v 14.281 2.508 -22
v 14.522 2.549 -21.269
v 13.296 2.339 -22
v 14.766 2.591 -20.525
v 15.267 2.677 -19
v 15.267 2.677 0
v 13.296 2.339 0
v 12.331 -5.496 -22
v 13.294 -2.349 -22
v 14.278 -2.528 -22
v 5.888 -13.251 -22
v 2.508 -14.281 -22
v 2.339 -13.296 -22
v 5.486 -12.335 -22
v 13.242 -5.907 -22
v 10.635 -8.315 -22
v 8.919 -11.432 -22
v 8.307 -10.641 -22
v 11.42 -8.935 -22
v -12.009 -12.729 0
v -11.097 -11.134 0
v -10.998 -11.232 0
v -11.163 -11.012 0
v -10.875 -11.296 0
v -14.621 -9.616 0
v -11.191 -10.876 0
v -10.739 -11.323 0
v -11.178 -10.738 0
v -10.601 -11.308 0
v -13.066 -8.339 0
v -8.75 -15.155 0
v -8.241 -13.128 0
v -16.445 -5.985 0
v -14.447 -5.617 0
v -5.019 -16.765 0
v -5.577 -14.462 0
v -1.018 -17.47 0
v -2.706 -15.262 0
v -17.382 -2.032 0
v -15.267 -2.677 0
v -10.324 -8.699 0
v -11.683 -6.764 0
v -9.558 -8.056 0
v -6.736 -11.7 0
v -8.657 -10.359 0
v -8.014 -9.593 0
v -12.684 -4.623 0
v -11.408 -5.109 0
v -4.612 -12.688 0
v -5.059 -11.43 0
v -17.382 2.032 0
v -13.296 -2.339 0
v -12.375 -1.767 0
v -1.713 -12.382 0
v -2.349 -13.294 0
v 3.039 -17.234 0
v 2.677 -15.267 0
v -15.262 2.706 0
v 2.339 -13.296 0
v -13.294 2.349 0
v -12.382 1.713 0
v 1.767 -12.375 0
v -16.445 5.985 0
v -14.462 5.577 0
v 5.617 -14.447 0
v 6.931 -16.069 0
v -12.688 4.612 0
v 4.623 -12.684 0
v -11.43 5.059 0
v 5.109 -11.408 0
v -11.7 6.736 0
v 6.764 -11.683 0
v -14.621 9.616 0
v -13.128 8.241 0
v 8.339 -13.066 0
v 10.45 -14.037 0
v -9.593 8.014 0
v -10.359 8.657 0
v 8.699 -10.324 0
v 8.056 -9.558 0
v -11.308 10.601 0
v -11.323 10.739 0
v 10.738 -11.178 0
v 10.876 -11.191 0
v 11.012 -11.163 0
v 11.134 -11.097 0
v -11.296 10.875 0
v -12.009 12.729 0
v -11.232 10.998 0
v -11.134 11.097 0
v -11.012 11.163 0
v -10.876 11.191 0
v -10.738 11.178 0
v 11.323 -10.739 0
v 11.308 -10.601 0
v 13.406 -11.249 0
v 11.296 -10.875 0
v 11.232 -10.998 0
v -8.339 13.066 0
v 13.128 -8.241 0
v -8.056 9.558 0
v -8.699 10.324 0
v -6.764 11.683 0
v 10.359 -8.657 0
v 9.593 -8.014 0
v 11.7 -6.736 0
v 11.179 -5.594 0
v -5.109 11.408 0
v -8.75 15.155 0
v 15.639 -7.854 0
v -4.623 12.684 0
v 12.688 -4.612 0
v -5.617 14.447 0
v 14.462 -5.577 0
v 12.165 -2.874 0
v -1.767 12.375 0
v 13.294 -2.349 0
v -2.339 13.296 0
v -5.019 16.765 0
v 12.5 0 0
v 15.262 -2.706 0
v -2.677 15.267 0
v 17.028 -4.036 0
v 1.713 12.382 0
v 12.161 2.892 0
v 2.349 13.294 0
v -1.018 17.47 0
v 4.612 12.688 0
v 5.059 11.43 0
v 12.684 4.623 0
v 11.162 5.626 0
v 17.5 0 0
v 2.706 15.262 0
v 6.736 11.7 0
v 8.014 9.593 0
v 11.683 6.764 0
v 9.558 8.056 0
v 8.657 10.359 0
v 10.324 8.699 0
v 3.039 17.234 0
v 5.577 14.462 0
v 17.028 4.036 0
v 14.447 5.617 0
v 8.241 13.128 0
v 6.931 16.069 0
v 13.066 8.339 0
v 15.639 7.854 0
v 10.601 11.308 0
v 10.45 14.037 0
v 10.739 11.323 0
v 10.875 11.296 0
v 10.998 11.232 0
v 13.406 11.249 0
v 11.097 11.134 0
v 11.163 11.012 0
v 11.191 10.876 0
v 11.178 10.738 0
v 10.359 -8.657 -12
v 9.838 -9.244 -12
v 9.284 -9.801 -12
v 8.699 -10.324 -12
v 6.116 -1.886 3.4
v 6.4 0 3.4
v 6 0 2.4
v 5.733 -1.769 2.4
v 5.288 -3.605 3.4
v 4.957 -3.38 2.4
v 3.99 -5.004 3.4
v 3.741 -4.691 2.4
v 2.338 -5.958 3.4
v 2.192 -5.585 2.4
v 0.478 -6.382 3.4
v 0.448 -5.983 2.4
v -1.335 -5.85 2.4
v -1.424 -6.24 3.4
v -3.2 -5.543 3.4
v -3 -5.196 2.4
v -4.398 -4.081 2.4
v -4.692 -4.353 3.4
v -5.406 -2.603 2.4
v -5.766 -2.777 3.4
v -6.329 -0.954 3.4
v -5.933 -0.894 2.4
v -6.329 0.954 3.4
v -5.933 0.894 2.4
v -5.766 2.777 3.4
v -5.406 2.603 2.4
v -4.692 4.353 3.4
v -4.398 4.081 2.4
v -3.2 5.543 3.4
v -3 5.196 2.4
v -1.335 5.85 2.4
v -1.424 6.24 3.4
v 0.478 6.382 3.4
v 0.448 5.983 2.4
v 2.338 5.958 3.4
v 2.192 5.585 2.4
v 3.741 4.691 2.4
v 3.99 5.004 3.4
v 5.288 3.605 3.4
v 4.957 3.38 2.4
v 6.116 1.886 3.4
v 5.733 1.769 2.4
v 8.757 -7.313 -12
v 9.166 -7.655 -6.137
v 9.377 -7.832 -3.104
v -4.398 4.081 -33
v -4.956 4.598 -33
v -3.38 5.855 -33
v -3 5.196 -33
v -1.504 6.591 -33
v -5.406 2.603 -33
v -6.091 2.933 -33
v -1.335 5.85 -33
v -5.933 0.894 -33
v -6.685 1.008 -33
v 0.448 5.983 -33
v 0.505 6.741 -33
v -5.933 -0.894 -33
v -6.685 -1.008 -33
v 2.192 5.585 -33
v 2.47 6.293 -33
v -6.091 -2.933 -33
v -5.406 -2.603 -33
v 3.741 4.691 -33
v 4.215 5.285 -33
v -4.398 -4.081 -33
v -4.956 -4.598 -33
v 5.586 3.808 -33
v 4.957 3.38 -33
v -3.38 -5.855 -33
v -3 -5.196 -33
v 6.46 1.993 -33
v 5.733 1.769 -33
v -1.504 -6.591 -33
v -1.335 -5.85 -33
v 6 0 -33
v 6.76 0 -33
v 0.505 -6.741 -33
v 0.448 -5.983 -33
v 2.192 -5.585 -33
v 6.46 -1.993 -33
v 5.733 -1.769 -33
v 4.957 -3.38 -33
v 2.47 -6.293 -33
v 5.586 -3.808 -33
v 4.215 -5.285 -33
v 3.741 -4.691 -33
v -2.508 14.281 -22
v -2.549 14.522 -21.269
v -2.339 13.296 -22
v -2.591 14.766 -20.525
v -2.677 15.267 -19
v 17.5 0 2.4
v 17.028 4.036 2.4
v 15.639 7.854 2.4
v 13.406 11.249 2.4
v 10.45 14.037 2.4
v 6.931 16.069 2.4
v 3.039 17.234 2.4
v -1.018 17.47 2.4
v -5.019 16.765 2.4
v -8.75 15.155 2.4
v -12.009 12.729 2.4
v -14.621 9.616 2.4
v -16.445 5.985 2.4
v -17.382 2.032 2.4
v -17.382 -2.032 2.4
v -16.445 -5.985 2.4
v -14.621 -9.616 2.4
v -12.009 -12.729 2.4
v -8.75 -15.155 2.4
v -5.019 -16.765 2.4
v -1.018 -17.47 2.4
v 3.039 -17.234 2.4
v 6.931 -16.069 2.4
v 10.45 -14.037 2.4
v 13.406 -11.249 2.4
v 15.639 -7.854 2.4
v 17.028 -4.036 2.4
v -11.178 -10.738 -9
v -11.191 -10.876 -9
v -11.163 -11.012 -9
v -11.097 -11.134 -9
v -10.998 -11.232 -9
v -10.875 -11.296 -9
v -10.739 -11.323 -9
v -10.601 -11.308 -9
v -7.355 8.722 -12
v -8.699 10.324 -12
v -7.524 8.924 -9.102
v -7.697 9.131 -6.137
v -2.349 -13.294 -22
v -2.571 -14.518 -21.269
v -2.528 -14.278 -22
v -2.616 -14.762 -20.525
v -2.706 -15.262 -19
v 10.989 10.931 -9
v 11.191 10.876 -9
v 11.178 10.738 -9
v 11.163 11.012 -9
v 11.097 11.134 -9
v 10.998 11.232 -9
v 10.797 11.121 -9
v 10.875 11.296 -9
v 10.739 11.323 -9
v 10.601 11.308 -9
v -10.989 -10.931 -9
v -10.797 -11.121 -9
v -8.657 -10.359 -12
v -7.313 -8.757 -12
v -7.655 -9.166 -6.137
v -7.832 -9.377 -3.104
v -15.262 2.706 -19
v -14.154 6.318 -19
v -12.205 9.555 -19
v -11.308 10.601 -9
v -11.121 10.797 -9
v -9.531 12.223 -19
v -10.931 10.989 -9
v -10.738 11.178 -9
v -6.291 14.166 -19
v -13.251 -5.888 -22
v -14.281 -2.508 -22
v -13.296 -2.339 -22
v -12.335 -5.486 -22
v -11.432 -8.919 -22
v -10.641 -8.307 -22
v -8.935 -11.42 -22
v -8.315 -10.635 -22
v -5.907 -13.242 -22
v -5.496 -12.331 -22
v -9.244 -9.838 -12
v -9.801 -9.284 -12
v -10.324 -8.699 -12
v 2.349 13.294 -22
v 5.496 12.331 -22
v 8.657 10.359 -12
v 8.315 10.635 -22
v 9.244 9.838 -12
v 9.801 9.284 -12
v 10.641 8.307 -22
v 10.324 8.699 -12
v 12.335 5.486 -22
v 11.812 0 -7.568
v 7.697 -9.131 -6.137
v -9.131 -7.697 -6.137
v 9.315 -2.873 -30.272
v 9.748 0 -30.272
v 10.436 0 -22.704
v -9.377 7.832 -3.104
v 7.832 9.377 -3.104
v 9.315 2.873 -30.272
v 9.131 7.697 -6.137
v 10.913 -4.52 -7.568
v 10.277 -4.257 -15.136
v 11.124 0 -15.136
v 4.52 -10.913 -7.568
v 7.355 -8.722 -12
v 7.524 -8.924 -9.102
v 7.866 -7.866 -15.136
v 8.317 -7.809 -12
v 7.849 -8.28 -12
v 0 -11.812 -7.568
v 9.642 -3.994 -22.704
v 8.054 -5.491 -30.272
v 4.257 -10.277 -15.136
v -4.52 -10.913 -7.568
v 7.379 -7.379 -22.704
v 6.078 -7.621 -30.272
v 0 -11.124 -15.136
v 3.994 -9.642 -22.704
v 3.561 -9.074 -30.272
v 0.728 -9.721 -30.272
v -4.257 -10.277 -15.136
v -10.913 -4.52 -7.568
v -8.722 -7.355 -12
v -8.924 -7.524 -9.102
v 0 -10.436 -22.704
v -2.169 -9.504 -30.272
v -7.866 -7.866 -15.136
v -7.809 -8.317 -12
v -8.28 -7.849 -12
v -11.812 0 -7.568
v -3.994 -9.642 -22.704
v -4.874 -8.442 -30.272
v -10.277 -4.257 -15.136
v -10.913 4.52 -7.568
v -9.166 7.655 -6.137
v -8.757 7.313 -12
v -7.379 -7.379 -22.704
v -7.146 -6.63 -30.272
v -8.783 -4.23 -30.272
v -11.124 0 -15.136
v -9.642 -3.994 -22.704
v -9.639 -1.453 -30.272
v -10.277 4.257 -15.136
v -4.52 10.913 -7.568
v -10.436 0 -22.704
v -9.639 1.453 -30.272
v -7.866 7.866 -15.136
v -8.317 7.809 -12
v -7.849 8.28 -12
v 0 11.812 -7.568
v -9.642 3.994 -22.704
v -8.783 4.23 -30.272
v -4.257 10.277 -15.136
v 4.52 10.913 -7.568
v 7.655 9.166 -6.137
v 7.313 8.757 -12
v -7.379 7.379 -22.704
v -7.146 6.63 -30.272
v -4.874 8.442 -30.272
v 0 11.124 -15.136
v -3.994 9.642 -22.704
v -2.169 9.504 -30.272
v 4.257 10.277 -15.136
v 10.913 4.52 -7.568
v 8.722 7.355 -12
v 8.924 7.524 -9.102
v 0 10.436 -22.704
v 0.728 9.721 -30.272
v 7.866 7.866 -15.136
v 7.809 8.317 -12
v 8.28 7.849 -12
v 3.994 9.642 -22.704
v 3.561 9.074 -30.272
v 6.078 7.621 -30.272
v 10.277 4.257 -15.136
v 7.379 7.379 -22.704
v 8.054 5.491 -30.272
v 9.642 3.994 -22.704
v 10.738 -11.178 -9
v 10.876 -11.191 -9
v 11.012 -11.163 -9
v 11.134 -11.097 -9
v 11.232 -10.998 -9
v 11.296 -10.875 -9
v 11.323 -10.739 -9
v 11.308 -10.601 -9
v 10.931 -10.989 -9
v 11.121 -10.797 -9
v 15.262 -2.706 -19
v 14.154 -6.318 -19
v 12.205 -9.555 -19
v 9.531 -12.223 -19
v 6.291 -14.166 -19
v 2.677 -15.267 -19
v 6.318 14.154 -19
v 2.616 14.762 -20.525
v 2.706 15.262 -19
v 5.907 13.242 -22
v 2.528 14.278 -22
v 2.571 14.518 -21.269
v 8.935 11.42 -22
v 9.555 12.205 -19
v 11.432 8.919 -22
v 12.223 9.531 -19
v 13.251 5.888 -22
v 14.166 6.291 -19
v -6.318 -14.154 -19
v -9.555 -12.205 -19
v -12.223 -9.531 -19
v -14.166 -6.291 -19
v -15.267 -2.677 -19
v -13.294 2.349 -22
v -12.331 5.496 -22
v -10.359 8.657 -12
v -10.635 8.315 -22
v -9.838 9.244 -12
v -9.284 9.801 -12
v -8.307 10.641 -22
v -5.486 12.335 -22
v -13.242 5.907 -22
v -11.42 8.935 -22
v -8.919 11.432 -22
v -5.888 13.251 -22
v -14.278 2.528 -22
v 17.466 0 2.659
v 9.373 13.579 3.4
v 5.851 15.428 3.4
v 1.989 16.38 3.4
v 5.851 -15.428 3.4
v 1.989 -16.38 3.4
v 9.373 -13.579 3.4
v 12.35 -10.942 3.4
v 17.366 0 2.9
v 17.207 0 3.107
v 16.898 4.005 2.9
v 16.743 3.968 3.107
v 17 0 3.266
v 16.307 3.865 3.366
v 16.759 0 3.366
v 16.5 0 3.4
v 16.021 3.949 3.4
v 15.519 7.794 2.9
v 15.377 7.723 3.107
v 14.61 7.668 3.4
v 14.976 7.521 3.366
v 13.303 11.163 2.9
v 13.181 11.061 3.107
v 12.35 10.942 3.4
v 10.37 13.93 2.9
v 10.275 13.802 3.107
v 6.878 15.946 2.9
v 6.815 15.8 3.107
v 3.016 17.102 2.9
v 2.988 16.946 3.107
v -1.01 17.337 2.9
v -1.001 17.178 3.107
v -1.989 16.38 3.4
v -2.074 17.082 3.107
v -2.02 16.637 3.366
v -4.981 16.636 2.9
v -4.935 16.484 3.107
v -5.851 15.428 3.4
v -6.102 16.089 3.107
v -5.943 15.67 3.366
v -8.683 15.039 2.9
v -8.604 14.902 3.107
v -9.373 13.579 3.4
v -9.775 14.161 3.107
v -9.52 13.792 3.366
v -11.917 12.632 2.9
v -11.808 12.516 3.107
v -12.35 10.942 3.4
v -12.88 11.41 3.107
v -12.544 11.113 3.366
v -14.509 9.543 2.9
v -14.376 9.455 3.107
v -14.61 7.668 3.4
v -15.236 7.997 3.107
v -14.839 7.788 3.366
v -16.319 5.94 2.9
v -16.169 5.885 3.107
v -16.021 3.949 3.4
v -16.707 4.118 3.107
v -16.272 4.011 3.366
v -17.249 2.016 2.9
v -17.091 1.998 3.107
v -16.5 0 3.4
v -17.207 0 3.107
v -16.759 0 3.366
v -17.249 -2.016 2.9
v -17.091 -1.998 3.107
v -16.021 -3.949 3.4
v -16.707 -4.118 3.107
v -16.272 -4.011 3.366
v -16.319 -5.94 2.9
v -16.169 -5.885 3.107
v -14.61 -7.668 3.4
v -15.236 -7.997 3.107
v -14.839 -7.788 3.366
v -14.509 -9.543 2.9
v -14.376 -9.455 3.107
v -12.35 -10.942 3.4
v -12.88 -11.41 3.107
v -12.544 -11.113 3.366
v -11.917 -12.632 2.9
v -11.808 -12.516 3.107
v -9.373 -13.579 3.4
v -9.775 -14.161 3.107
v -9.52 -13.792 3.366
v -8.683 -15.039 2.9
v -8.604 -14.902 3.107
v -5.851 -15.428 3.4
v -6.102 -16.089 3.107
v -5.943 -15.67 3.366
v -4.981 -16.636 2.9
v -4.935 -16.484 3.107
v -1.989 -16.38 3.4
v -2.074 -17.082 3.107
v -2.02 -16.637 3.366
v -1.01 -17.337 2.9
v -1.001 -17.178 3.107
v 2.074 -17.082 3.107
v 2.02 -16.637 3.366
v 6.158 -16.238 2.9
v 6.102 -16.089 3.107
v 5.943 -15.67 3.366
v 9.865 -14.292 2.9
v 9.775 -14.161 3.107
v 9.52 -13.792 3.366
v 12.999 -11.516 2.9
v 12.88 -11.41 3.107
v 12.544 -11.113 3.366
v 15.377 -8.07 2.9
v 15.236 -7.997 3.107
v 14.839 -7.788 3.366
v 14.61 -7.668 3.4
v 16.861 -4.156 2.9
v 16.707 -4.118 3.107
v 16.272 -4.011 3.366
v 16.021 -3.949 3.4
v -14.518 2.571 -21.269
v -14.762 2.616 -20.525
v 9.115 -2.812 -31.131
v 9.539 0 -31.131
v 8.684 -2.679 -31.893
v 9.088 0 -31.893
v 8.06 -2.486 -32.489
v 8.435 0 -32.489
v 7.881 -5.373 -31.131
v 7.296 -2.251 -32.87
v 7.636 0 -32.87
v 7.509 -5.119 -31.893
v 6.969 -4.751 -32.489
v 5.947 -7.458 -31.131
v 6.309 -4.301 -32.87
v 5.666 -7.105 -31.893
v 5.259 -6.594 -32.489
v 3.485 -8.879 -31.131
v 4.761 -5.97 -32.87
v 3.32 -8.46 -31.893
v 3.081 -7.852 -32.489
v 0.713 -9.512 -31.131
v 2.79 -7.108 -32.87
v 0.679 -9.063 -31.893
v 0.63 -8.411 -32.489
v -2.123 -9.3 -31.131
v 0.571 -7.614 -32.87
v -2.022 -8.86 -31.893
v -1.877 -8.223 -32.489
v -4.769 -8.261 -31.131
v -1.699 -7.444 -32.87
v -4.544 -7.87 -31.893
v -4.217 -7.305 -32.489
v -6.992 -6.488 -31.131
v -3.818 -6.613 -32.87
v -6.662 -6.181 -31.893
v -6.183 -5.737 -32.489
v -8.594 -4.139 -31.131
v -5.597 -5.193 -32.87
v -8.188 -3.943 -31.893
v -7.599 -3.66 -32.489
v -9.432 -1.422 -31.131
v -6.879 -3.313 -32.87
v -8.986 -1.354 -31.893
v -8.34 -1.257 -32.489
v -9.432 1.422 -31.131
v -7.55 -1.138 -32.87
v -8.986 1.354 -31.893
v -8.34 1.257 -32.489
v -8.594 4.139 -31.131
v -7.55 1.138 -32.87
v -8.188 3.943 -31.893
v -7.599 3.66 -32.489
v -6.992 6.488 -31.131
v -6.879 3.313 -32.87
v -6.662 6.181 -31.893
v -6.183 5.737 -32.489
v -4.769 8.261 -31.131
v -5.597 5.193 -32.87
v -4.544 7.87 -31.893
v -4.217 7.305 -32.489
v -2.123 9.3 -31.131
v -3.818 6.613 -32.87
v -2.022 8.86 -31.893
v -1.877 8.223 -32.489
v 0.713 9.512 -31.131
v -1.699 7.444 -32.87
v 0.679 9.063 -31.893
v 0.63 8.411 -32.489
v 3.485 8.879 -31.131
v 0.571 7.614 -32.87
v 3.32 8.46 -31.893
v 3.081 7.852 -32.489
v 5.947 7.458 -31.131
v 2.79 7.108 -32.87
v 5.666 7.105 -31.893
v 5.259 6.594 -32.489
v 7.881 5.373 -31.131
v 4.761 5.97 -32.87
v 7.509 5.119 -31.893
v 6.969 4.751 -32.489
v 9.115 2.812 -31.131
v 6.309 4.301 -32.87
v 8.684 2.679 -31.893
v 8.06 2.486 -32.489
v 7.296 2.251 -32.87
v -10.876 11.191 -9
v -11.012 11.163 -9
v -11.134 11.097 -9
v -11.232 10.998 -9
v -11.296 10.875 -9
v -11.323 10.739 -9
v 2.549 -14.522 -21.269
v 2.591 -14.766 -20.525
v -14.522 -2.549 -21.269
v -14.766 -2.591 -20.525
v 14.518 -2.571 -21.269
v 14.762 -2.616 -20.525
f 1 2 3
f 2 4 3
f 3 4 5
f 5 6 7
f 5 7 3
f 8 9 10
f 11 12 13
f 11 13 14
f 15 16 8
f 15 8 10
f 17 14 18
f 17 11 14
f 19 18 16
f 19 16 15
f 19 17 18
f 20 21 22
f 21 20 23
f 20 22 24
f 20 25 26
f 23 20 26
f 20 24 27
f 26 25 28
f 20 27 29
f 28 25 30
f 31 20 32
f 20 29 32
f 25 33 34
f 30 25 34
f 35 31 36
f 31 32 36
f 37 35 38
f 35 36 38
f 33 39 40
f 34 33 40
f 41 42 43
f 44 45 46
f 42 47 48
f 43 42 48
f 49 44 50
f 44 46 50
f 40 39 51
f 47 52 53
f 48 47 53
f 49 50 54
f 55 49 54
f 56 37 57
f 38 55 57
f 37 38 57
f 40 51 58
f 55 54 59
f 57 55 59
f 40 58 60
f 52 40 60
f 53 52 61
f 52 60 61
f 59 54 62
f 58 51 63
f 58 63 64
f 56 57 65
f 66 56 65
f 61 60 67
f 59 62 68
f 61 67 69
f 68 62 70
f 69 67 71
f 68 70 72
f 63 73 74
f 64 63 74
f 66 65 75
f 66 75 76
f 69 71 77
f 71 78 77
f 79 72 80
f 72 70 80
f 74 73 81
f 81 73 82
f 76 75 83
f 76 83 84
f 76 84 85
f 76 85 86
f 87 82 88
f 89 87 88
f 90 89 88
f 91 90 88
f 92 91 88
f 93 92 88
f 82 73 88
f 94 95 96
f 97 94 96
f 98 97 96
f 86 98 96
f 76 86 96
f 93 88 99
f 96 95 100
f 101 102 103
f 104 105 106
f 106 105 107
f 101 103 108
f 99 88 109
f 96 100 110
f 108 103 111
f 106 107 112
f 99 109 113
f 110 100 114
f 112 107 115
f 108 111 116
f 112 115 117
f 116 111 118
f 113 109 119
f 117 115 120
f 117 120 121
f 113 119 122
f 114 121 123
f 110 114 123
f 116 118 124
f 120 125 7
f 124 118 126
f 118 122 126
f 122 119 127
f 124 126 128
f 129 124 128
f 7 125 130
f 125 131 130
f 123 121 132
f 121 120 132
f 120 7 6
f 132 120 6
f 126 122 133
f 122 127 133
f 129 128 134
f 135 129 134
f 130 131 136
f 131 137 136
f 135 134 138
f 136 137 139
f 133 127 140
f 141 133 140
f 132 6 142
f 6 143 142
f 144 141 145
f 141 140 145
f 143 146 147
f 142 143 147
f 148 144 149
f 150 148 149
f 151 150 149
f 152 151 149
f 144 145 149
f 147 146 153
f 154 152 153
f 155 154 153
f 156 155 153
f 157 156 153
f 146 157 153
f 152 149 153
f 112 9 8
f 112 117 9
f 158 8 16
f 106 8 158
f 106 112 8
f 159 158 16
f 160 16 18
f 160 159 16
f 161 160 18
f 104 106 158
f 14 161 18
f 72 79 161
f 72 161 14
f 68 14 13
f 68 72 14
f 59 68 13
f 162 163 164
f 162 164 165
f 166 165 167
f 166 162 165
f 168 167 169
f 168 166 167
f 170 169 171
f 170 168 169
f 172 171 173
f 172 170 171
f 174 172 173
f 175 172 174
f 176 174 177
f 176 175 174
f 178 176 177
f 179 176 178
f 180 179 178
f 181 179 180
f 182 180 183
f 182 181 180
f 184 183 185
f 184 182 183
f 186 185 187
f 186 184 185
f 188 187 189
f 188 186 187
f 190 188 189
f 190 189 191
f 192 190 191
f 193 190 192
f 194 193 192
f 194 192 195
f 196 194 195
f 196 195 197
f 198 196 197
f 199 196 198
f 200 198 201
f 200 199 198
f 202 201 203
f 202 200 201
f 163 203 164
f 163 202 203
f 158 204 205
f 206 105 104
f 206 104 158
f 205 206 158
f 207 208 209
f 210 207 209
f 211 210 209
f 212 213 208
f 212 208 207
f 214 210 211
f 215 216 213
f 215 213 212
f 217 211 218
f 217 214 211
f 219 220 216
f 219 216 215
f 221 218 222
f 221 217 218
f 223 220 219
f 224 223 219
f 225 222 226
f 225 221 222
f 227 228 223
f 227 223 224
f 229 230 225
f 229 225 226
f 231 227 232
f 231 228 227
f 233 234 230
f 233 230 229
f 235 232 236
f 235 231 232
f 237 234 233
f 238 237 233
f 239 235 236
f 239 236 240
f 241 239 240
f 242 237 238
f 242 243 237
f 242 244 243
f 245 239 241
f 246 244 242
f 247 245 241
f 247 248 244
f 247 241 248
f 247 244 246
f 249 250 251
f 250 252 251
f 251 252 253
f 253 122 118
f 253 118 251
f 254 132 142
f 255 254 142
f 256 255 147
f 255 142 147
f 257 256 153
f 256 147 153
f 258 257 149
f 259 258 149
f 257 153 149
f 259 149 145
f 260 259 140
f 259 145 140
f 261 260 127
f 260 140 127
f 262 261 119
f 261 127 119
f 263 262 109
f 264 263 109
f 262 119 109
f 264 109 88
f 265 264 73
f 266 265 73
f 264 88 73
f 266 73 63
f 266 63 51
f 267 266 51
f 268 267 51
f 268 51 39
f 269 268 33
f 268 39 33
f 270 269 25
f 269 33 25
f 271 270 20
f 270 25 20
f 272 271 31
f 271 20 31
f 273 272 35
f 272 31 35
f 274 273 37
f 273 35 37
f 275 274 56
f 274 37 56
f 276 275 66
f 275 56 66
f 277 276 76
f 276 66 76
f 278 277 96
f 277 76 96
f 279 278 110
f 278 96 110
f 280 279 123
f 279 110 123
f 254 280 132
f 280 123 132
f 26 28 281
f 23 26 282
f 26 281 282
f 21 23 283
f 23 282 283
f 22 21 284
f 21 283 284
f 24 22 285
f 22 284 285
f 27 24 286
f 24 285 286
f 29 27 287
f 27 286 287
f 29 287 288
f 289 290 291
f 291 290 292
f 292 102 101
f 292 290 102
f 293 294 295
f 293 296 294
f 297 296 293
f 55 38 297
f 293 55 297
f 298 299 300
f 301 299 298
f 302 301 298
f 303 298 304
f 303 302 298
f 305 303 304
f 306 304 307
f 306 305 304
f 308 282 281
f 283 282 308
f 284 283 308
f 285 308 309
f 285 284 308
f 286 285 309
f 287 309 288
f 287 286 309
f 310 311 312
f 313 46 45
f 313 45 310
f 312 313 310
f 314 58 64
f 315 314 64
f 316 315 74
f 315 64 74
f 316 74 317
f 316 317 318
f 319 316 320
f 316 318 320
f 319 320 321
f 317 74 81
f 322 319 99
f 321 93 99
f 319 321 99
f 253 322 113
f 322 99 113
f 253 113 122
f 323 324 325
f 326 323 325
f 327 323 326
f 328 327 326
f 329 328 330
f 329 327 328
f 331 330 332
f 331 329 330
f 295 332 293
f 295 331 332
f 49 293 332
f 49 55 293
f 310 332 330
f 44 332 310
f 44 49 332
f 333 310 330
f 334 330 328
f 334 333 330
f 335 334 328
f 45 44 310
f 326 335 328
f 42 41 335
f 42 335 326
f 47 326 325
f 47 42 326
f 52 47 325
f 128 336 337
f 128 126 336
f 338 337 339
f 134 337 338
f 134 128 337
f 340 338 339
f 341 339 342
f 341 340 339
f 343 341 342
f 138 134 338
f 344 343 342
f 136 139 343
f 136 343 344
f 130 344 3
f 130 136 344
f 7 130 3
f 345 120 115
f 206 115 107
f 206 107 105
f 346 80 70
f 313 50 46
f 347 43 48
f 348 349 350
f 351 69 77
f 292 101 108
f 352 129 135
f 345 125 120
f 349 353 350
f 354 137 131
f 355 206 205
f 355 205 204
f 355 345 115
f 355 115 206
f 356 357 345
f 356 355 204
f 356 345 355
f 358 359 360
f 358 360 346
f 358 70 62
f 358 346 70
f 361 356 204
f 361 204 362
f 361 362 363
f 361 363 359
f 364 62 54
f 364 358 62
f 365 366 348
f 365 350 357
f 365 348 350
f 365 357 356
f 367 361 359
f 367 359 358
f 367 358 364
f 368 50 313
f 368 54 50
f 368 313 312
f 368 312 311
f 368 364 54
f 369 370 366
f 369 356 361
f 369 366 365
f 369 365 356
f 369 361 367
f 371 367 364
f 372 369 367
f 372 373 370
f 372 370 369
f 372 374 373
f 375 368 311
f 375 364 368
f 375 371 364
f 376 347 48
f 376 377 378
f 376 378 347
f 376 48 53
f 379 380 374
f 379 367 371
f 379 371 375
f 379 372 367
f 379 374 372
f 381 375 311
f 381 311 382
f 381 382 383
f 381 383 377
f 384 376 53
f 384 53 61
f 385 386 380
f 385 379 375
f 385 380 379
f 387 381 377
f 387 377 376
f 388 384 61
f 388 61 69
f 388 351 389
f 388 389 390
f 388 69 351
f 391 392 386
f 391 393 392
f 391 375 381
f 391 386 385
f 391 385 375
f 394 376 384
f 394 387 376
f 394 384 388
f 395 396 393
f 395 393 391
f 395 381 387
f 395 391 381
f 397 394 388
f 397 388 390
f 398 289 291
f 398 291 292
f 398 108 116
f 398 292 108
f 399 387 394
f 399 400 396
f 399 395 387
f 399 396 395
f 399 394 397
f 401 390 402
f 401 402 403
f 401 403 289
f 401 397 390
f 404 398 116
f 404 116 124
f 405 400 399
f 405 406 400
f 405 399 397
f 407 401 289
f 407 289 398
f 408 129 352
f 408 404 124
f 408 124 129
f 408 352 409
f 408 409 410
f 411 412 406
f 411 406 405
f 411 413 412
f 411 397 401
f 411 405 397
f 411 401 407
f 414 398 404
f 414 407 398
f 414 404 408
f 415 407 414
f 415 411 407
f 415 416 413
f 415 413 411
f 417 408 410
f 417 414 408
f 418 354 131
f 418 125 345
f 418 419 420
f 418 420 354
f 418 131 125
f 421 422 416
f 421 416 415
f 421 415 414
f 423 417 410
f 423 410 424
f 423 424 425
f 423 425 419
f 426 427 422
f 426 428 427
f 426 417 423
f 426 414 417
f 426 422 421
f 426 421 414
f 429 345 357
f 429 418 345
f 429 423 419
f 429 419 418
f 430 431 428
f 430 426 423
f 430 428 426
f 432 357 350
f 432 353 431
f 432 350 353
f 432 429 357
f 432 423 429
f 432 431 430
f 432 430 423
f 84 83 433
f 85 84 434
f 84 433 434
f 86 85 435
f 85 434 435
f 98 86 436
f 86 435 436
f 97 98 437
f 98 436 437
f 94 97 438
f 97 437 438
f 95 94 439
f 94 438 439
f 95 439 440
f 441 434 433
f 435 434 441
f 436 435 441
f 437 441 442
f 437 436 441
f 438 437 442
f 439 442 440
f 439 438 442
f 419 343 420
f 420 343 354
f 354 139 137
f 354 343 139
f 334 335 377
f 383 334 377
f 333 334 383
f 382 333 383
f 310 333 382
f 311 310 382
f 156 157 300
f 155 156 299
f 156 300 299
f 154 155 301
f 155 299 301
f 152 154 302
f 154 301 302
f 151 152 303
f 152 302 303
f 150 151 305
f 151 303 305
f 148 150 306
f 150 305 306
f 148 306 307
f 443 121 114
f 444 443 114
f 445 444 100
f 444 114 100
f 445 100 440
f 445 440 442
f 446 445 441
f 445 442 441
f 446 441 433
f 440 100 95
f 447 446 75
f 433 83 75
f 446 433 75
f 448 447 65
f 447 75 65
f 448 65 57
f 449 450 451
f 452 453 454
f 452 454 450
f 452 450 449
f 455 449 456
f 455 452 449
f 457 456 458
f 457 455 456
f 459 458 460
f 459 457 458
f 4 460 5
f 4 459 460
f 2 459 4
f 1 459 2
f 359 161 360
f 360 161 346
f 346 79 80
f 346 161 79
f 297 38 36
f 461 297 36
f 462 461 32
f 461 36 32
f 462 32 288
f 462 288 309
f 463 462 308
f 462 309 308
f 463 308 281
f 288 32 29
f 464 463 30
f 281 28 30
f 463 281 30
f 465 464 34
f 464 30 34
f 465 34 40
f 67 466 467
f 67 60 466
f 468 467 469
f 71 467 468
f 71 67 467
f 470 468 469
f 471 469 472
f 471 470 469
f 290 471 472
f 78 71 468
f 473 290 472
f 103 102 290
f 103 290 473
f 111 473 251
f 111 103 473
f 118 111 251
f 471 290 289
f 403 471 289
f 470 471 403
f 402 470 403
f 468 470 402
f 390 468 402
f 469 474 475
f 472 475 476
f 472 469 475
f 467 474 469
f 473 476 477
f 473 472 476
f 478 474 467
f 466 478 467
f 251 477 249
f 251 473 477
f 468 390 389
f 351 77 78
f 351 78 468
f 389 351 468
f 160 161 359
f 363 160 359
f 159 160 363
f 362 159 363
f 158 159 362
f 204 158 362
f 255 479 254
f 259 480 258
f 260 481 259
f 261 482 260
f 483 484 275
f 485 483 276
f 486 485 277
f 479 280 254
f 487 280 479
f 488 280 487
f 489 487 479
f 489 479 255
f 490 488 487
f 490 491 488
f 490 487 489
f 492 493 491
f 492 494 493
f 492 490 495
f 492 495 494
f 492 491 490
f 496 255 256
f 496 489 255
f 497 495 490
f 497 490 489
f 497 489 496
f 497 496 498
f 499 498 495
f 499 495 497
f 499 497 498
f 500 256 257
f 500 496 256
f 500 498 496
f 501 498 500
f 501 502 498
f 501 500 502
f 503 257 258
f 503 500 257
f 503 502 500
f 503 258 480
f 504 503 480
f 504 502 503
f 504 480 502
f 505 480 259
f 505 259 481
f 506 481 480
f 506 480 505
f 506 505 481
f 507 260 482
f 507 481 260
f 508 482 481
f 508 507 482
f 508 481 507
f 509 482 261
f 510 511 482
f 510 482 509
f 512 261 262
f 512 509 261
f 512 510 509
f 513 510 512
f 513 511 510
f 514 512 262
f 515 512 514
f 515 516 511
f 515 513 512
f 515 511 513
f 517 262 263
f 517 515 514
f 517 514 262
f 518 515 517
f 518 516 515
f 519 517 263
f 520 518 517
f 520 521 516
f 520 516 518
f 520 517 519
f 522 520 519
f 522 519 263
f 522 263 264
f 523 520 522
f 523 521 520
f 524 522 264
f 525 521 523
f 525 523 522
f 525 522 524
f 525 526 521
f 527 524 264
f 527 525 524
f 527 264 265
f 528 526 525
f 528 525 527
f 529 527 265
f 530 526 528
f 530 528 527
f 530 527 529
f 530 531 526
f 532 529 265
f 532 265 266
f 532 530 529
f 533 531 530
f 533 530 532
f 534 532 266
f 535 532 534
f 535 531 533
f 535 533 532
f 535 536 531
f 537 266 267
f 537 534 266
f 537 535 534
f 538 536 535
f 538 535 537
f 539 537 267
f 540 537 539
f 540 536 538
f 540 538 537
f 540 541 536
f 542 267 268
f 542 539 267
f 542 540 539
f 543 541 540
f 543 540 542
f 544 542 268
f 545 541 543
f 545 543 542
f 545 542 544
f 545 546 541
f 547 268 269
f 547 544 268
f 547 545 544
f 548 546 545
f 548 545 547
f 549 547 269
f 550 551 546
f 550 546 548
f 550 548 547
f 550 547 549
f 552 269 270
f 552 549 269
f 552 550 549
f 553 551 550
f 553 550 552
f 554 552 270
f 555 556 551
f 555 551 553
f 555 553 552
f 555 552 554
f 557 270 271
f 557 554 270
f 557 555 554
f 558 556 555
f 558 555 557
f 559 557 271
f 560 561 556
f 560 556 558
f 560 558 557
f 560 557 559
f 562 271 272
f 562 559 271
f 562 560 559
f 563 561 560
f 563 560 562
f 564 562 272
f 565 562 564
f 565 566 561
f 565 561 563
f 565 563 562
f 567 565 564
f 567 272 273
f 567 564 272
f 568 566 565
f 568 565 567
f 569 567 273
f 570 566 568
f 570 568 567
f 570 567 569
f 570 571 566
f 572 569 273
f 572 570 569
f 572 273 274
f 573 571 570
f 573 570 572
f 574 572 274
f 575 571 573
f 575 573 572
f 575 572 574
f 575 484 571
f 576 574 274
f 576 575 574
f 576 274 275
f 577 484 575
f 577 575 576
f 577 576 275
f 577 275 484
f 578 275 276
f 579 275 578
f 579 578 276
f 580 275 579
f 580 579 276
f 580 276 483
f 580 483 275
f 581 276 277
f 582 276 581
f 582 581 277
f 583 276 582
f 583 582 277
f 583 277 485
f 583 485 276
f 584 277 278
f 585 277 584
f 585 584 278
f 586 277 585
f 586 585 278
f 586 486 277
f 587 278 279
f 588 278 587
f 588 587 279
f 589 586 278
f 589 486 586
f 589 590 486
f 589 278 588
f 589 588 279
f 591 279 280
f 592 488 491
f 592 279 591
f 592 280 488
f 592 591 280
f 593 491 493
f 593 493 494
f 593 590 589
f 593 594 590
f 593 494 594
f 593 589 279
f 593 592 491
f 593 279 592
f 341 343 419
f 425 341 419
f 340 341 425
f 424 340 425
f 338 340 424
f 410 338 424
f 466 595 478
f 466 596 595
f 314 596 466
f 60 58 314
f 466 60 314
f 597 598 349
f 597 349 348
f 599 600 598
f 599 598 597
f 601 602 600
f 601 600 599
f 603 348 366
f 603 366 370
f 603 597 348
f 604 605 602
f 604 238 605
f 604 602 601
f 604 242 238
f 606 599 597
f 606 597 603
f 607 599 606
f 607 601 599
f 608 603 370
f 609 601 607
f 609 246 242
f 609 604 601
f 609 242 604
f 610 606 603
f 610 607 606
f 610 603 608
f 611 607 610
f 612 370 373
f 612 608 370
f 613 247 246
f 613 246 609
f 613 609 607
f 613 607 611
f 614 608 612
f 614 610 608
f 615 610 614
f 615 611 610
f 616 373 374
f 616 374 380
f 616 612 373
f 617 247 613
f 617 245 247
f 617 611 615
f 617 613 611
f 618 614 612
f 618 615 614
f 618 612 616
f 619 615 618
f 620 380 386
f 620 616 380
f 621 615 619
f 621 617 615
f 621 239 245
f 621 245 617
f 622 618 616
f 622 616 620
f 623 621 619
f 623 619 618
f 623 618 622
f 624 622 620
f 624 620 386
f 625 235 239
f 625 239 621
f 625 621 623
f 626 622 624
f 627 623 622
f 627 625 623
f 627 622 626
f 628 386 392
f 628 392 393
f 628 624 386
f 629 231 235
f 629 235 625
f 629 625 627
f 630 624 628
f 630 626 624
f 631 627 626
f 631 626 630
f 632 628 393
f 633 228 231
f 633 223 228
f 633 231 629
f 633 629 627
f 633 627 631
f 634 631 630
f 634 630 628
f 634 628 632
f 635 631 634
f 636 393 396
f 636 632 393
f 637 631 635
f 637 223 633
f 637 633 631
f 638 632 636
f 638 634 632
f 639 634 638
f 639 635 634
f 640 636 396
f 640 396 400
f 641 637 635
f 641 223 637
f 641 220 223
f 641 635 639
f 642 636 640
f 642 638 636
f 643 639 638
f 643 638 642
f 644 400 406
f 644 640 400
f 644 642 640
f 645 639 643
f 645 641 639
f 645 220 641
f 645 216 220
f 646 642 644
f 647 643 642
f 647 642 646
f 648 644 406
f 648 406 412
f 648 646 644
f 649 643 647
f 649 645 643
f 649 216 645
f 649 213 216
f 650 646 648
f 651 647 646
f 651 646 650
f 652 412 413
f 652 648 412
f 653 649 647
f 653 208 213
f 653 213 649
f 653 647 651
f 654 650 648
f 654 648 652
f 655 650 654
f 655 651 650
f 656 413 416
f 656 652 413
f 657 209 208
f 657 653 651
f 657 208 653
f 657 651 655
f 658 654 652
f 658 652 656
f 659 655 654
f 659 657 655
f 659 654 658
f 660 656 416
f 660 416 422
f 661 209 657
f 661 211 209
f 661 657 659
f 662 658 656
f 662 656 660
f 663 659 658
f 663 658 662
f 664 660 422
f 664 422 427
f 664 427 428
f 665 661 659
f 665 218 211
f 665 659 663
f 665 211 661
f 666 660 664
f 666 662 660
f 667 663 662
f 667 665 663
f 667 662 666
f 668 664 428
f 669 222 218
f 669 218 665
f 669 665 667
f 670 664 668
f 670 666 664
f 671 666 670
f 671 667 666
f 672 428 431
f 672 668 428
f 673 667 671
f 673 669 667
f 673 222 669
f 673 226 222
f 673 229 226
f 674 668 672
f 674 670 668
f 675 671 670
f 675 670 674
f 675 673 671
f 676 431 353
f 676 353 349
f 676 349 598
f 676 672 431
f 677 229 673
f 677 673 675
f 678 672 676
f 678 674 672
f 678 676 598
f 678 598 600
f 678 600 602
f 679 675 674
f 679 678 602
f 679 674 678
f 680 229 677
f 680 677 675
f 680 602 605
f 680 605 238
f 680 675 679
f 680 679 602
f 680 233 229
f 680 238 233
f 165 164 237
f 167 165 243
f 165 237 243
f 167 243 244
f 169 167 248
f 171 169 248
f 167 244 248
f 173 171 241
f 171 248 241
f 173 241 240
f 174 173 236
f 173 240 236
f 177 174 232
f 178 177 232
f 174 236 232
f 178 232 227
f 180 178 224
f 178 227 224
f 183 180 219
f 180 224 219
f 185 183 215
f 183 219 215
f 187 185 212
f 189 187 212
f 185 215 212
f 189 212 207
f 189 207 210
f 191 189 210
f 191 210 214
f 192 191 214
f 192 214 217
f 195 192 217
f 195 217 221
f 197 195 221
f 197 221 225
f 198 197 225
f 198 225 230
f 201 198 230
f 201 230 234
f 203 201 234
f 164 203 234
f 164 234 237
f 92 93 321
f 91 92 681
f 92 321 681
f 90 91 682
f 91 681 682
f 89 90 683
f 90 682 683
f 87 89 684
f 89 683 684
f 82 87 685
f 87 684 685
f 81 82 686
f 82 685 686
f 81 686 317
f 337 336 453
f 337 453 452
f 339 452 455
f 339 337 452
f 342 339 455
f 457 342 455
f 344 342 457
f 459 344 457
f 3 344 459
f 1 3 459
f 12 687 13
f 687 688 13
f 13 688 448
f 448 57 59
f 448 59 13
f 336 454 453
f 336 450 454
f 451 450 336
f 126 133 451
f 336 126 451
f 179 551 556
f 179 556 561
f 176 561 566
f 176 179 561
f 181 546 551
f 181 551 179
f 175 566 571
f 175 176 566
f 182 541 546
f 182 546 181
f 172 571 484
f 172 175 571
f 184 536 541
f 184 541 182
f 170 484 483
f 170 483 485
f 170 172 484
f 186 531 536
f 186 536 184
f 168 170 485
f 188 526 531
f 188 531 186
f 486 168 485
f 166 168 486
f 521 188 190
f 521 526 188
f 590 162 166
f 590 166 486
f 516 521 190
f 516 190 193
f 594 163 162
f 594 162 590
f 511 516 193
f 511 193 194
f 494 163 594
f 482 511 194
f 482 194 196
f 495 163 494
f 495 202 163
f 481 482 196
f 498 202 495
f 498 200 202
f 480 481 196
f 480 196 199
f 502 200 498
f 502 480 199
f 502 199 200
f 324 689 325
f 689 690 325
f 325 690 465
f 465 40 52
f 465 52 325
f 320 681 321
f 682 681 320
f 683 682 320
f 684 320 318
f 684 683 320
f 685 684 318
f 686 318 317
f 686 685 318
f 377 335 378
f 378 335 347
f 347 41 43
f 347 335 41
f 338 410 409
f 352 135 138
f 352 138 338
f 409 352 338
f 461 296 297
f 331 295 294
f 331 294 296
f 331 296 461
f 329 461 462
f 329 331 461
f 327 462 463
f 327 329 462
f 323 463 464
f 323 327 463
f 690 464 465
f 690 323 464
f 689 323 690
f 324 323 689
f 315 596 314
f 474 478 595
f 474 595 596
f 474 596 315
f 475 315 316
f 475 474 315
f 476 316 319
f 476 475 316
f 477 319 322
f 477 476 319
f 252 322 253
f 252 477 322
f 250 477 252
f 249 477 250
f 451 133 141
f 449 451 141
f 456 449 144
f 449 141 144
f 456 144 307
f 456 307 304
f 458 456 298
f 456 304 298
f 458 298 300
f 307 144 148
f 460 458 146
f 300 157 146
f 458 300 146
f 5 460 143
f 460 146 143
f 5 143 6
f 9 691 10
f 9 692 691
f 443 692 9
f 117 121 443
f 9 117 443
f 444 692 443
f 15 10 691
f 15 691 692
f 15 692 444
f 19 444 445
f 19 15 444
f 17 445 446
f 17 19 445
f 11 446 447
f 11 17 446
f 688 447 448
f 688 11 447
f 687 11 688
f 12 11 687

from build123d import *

# Parameters (mm, degrees)
SKETCH_R              = 17.5
PAD_DEPTH             = 3.4
FILLET_R              = 1
SKETCH001_R           = 15.5
SKETCH001_R_2         = 13.5
PAD001_DEPTH          = 22
CHAMFER_SIZE2         = 1
CHAMFER_SIZE          = 3
POCKET_DEPTH          = 22
POLARPATTERN_COUNT    = 4
PAD002_DEPTH          = 10
POLARPATTERN001_COUNT = 4
SKETCH006_R           = 12.5
SKETCH005_R           = 9.5
SKETCH007_R           = 6
POCKET001_DEPTH       = 36.401
FILLET001_R           = 3
CHAMFER002_SIZE2      = 0.4
CHAMFER002_SIZE       = 1
PAD003_DEPTH          = 12
POLARPATTERN002_COUNT = 4


with BuildPart() as part:
    # Sketch (on XY_Plane of Origin) → Pad (new body)
    with BuildSketch(Plane.XY):
        Circle(SKETCH_R)
    extrude(amount=PAD_DEPTH)

    # Fillet
    fillet_edges = [part.edges().sort_by_distance(p)[0] for p in [
        (-17.5, 0, 3.4),
    ]]
    fillet(fillet_edges, radius=FILLET_R)

    # Sketch001 (on Face3 of Fillet) → Pad001 (join)
    with BuildSketch(Plane(origin=(0, 0, 0), x_dir=(1, 0, 0), z_dir=(0, 0, -1))):
        Circle(SKETCH001_R)
        Circle(SKETCH001_R_2, mode=Mode.SUBTRACT)
    extrude(amount=PAD001_DEPTH)

    # Chamfer
    chamfer_edges = [part.edges().sort_by_distance(p)[0] for p in [
        (-15.5, 0, -22),
    ]]
    chamfer_side = part.faces().sort_by_distance((-15.5, 0, -11))[0]
    chamfer(chamfer_edges, length=CHAMFER_SIZE, length2=CHAMFER_SIZE2, reference=chamfer_side)

    # Sketch003 (on Face3 of Chamfer) → Pocket (cut)
    with BuildSketch(Plane(origin=(0, 0, 0), x_dir=(1, 0, 0), z_dir=(0, 0, -1))):
        with BuildLine():
            ThreePointArc((2.929699, 16.745652), (-0.022663, 16.999985), (-2.974337, 16.737781))
            Line((-2.974337, 16.737781), (-2.170603, 12.310097))
            ThreePointArc((2.170603, 12.310097), (0, 12.5), (-2.170603, 12.310097))
            Line((2.929699, 16.745652), (2.170603, 12.310097))
        make_face()
    pocket = extrude(amount=POCKET_DEPTH, mode=Mode.SUBTRACT)

    # PolarPattern: Pocket ×4 about axis
    polarpattern_axis = Axis((0, 0, 0), (0, 0, -1))
    for i in range(1, POLARPATTERN_COUNT):
        add(pocket.rotate(polarpattern_axis, i * 360 / POLARPATTERN_COUNT), mode=Mode.SUBTRACT)

    # Sketch004 → Pad002 (join)
    with BuildSketch(Plane(origin=(0, 0, -9), x_dir=(0.707107, 0.707107, 0), z_dir=(0, 0, 1))):
        with BuildLine():
            ThreePointArc((0.31147, 15.49687), (-0.094297, 15.499713), (-0.5, 15.491933))
            ThreePointArc((0.31147, 15.49687), (-0.095665, 15.724518), (-0.5, 15.491933))
        make_face()
    pad002 = extrude(amount=PAD002_DEPTH)

    # PolarPattern001: Pad002 ×4 about axis
    polarpattern001_axis = Axis((0, 0, -9), (0, 0, 1))
    for i in range(1, POLARPATTERN001_COUNT):
        add(pad002.rotate(polarpattern001_axis, i * 360 / POLARPATTERN001_COUNT))

    # Sketch006 (on Face3 of PolarPattern001) → AdditiveLoft section 0
    with BuildSketch(Plane(origin=(0, 0, 0), x_dir=(1, 0, 0), z_dir=(0, 0, -1))):
        Circle(SKETCH006_R)
    # Sketch005 (on Face3 of PolarPattern001) → AdditiveLoft section 1
    with BuildSketch(Plane(origin=(0, 0, -33), x_dir=(1, 0, 0), z_dir=(0, 0, -1))):
        Circle(SKETCH005_R)
    loft()

    # Sketch007 (on Face32 of AdditiveLoft) → Pocket001 (cut, through all)
    with BuildSketch(Plane(origin=(0, 0, -33), x_dir=(1, 0, 0), z_dir=(0, 0, -1))):
        Circle(SKETCH007_R)
    extrude(amount=-POCKET001_DEPTH, mode=Mode.SUBTRACT)

    # Fillet001
    fillet001_edges = [part.edges().sort_by_distance(p)[0] for p in [
        (-9.5, 0, -33),
    ]]
    fillet(fillet001_edges, radius=FILLET001_R)

    # Chamfer002
    chamfer002_edges = [part.edges().sort_by_distance(p)[0] for p in [
        (-6, 0, 3.4),
    ]]
    chamfer002_side = part.faces().sort_by_distance((-6, 0, -14.8))[0]
    chamfer(chamfer002_edges, length=CHAMFER002_SIZE, length2=CHAMFER002_SIZE2, reference=chamfer002_side)

    # Sketch008 (on Face9 of Chamfer002) → Pad003 (join)
    with BuildSketch(Plane(origin=(0, 0, 0), x_dir=(0.087156, -0.996195, 0), z_dir=(0, 0, -1))):
        with BuildLine():
            ThreePointArc((-9.880104, 9.918848), (-10.706992, 9.019996), (-11.452393, 8.052496))
            Line((-11.452393, 8.052496), (-7.356621, 5.184605))
            ThreePointArc((-6.344559, 6.383304), (-6.876758, 5.806048), (-7.356621, 5.184605))
            Line((-6.344559, 6.383304), (-9.880104, 9.918848))
        make_face()
    pad003 = extrude(amount=PAD003_DEPTH)

    # PolarPattern002: Pad003 ×4 about axis
    polarpattern002_axis = Axis((0, 0, 0), (0, 0, -1))
    for i in range(1, POLARPATTERN002_COUNT):
        add(pad003.rotate(polarpattern002_axis, i * 360 / POLARPATTERN002_COUNT))


solid = part.part
